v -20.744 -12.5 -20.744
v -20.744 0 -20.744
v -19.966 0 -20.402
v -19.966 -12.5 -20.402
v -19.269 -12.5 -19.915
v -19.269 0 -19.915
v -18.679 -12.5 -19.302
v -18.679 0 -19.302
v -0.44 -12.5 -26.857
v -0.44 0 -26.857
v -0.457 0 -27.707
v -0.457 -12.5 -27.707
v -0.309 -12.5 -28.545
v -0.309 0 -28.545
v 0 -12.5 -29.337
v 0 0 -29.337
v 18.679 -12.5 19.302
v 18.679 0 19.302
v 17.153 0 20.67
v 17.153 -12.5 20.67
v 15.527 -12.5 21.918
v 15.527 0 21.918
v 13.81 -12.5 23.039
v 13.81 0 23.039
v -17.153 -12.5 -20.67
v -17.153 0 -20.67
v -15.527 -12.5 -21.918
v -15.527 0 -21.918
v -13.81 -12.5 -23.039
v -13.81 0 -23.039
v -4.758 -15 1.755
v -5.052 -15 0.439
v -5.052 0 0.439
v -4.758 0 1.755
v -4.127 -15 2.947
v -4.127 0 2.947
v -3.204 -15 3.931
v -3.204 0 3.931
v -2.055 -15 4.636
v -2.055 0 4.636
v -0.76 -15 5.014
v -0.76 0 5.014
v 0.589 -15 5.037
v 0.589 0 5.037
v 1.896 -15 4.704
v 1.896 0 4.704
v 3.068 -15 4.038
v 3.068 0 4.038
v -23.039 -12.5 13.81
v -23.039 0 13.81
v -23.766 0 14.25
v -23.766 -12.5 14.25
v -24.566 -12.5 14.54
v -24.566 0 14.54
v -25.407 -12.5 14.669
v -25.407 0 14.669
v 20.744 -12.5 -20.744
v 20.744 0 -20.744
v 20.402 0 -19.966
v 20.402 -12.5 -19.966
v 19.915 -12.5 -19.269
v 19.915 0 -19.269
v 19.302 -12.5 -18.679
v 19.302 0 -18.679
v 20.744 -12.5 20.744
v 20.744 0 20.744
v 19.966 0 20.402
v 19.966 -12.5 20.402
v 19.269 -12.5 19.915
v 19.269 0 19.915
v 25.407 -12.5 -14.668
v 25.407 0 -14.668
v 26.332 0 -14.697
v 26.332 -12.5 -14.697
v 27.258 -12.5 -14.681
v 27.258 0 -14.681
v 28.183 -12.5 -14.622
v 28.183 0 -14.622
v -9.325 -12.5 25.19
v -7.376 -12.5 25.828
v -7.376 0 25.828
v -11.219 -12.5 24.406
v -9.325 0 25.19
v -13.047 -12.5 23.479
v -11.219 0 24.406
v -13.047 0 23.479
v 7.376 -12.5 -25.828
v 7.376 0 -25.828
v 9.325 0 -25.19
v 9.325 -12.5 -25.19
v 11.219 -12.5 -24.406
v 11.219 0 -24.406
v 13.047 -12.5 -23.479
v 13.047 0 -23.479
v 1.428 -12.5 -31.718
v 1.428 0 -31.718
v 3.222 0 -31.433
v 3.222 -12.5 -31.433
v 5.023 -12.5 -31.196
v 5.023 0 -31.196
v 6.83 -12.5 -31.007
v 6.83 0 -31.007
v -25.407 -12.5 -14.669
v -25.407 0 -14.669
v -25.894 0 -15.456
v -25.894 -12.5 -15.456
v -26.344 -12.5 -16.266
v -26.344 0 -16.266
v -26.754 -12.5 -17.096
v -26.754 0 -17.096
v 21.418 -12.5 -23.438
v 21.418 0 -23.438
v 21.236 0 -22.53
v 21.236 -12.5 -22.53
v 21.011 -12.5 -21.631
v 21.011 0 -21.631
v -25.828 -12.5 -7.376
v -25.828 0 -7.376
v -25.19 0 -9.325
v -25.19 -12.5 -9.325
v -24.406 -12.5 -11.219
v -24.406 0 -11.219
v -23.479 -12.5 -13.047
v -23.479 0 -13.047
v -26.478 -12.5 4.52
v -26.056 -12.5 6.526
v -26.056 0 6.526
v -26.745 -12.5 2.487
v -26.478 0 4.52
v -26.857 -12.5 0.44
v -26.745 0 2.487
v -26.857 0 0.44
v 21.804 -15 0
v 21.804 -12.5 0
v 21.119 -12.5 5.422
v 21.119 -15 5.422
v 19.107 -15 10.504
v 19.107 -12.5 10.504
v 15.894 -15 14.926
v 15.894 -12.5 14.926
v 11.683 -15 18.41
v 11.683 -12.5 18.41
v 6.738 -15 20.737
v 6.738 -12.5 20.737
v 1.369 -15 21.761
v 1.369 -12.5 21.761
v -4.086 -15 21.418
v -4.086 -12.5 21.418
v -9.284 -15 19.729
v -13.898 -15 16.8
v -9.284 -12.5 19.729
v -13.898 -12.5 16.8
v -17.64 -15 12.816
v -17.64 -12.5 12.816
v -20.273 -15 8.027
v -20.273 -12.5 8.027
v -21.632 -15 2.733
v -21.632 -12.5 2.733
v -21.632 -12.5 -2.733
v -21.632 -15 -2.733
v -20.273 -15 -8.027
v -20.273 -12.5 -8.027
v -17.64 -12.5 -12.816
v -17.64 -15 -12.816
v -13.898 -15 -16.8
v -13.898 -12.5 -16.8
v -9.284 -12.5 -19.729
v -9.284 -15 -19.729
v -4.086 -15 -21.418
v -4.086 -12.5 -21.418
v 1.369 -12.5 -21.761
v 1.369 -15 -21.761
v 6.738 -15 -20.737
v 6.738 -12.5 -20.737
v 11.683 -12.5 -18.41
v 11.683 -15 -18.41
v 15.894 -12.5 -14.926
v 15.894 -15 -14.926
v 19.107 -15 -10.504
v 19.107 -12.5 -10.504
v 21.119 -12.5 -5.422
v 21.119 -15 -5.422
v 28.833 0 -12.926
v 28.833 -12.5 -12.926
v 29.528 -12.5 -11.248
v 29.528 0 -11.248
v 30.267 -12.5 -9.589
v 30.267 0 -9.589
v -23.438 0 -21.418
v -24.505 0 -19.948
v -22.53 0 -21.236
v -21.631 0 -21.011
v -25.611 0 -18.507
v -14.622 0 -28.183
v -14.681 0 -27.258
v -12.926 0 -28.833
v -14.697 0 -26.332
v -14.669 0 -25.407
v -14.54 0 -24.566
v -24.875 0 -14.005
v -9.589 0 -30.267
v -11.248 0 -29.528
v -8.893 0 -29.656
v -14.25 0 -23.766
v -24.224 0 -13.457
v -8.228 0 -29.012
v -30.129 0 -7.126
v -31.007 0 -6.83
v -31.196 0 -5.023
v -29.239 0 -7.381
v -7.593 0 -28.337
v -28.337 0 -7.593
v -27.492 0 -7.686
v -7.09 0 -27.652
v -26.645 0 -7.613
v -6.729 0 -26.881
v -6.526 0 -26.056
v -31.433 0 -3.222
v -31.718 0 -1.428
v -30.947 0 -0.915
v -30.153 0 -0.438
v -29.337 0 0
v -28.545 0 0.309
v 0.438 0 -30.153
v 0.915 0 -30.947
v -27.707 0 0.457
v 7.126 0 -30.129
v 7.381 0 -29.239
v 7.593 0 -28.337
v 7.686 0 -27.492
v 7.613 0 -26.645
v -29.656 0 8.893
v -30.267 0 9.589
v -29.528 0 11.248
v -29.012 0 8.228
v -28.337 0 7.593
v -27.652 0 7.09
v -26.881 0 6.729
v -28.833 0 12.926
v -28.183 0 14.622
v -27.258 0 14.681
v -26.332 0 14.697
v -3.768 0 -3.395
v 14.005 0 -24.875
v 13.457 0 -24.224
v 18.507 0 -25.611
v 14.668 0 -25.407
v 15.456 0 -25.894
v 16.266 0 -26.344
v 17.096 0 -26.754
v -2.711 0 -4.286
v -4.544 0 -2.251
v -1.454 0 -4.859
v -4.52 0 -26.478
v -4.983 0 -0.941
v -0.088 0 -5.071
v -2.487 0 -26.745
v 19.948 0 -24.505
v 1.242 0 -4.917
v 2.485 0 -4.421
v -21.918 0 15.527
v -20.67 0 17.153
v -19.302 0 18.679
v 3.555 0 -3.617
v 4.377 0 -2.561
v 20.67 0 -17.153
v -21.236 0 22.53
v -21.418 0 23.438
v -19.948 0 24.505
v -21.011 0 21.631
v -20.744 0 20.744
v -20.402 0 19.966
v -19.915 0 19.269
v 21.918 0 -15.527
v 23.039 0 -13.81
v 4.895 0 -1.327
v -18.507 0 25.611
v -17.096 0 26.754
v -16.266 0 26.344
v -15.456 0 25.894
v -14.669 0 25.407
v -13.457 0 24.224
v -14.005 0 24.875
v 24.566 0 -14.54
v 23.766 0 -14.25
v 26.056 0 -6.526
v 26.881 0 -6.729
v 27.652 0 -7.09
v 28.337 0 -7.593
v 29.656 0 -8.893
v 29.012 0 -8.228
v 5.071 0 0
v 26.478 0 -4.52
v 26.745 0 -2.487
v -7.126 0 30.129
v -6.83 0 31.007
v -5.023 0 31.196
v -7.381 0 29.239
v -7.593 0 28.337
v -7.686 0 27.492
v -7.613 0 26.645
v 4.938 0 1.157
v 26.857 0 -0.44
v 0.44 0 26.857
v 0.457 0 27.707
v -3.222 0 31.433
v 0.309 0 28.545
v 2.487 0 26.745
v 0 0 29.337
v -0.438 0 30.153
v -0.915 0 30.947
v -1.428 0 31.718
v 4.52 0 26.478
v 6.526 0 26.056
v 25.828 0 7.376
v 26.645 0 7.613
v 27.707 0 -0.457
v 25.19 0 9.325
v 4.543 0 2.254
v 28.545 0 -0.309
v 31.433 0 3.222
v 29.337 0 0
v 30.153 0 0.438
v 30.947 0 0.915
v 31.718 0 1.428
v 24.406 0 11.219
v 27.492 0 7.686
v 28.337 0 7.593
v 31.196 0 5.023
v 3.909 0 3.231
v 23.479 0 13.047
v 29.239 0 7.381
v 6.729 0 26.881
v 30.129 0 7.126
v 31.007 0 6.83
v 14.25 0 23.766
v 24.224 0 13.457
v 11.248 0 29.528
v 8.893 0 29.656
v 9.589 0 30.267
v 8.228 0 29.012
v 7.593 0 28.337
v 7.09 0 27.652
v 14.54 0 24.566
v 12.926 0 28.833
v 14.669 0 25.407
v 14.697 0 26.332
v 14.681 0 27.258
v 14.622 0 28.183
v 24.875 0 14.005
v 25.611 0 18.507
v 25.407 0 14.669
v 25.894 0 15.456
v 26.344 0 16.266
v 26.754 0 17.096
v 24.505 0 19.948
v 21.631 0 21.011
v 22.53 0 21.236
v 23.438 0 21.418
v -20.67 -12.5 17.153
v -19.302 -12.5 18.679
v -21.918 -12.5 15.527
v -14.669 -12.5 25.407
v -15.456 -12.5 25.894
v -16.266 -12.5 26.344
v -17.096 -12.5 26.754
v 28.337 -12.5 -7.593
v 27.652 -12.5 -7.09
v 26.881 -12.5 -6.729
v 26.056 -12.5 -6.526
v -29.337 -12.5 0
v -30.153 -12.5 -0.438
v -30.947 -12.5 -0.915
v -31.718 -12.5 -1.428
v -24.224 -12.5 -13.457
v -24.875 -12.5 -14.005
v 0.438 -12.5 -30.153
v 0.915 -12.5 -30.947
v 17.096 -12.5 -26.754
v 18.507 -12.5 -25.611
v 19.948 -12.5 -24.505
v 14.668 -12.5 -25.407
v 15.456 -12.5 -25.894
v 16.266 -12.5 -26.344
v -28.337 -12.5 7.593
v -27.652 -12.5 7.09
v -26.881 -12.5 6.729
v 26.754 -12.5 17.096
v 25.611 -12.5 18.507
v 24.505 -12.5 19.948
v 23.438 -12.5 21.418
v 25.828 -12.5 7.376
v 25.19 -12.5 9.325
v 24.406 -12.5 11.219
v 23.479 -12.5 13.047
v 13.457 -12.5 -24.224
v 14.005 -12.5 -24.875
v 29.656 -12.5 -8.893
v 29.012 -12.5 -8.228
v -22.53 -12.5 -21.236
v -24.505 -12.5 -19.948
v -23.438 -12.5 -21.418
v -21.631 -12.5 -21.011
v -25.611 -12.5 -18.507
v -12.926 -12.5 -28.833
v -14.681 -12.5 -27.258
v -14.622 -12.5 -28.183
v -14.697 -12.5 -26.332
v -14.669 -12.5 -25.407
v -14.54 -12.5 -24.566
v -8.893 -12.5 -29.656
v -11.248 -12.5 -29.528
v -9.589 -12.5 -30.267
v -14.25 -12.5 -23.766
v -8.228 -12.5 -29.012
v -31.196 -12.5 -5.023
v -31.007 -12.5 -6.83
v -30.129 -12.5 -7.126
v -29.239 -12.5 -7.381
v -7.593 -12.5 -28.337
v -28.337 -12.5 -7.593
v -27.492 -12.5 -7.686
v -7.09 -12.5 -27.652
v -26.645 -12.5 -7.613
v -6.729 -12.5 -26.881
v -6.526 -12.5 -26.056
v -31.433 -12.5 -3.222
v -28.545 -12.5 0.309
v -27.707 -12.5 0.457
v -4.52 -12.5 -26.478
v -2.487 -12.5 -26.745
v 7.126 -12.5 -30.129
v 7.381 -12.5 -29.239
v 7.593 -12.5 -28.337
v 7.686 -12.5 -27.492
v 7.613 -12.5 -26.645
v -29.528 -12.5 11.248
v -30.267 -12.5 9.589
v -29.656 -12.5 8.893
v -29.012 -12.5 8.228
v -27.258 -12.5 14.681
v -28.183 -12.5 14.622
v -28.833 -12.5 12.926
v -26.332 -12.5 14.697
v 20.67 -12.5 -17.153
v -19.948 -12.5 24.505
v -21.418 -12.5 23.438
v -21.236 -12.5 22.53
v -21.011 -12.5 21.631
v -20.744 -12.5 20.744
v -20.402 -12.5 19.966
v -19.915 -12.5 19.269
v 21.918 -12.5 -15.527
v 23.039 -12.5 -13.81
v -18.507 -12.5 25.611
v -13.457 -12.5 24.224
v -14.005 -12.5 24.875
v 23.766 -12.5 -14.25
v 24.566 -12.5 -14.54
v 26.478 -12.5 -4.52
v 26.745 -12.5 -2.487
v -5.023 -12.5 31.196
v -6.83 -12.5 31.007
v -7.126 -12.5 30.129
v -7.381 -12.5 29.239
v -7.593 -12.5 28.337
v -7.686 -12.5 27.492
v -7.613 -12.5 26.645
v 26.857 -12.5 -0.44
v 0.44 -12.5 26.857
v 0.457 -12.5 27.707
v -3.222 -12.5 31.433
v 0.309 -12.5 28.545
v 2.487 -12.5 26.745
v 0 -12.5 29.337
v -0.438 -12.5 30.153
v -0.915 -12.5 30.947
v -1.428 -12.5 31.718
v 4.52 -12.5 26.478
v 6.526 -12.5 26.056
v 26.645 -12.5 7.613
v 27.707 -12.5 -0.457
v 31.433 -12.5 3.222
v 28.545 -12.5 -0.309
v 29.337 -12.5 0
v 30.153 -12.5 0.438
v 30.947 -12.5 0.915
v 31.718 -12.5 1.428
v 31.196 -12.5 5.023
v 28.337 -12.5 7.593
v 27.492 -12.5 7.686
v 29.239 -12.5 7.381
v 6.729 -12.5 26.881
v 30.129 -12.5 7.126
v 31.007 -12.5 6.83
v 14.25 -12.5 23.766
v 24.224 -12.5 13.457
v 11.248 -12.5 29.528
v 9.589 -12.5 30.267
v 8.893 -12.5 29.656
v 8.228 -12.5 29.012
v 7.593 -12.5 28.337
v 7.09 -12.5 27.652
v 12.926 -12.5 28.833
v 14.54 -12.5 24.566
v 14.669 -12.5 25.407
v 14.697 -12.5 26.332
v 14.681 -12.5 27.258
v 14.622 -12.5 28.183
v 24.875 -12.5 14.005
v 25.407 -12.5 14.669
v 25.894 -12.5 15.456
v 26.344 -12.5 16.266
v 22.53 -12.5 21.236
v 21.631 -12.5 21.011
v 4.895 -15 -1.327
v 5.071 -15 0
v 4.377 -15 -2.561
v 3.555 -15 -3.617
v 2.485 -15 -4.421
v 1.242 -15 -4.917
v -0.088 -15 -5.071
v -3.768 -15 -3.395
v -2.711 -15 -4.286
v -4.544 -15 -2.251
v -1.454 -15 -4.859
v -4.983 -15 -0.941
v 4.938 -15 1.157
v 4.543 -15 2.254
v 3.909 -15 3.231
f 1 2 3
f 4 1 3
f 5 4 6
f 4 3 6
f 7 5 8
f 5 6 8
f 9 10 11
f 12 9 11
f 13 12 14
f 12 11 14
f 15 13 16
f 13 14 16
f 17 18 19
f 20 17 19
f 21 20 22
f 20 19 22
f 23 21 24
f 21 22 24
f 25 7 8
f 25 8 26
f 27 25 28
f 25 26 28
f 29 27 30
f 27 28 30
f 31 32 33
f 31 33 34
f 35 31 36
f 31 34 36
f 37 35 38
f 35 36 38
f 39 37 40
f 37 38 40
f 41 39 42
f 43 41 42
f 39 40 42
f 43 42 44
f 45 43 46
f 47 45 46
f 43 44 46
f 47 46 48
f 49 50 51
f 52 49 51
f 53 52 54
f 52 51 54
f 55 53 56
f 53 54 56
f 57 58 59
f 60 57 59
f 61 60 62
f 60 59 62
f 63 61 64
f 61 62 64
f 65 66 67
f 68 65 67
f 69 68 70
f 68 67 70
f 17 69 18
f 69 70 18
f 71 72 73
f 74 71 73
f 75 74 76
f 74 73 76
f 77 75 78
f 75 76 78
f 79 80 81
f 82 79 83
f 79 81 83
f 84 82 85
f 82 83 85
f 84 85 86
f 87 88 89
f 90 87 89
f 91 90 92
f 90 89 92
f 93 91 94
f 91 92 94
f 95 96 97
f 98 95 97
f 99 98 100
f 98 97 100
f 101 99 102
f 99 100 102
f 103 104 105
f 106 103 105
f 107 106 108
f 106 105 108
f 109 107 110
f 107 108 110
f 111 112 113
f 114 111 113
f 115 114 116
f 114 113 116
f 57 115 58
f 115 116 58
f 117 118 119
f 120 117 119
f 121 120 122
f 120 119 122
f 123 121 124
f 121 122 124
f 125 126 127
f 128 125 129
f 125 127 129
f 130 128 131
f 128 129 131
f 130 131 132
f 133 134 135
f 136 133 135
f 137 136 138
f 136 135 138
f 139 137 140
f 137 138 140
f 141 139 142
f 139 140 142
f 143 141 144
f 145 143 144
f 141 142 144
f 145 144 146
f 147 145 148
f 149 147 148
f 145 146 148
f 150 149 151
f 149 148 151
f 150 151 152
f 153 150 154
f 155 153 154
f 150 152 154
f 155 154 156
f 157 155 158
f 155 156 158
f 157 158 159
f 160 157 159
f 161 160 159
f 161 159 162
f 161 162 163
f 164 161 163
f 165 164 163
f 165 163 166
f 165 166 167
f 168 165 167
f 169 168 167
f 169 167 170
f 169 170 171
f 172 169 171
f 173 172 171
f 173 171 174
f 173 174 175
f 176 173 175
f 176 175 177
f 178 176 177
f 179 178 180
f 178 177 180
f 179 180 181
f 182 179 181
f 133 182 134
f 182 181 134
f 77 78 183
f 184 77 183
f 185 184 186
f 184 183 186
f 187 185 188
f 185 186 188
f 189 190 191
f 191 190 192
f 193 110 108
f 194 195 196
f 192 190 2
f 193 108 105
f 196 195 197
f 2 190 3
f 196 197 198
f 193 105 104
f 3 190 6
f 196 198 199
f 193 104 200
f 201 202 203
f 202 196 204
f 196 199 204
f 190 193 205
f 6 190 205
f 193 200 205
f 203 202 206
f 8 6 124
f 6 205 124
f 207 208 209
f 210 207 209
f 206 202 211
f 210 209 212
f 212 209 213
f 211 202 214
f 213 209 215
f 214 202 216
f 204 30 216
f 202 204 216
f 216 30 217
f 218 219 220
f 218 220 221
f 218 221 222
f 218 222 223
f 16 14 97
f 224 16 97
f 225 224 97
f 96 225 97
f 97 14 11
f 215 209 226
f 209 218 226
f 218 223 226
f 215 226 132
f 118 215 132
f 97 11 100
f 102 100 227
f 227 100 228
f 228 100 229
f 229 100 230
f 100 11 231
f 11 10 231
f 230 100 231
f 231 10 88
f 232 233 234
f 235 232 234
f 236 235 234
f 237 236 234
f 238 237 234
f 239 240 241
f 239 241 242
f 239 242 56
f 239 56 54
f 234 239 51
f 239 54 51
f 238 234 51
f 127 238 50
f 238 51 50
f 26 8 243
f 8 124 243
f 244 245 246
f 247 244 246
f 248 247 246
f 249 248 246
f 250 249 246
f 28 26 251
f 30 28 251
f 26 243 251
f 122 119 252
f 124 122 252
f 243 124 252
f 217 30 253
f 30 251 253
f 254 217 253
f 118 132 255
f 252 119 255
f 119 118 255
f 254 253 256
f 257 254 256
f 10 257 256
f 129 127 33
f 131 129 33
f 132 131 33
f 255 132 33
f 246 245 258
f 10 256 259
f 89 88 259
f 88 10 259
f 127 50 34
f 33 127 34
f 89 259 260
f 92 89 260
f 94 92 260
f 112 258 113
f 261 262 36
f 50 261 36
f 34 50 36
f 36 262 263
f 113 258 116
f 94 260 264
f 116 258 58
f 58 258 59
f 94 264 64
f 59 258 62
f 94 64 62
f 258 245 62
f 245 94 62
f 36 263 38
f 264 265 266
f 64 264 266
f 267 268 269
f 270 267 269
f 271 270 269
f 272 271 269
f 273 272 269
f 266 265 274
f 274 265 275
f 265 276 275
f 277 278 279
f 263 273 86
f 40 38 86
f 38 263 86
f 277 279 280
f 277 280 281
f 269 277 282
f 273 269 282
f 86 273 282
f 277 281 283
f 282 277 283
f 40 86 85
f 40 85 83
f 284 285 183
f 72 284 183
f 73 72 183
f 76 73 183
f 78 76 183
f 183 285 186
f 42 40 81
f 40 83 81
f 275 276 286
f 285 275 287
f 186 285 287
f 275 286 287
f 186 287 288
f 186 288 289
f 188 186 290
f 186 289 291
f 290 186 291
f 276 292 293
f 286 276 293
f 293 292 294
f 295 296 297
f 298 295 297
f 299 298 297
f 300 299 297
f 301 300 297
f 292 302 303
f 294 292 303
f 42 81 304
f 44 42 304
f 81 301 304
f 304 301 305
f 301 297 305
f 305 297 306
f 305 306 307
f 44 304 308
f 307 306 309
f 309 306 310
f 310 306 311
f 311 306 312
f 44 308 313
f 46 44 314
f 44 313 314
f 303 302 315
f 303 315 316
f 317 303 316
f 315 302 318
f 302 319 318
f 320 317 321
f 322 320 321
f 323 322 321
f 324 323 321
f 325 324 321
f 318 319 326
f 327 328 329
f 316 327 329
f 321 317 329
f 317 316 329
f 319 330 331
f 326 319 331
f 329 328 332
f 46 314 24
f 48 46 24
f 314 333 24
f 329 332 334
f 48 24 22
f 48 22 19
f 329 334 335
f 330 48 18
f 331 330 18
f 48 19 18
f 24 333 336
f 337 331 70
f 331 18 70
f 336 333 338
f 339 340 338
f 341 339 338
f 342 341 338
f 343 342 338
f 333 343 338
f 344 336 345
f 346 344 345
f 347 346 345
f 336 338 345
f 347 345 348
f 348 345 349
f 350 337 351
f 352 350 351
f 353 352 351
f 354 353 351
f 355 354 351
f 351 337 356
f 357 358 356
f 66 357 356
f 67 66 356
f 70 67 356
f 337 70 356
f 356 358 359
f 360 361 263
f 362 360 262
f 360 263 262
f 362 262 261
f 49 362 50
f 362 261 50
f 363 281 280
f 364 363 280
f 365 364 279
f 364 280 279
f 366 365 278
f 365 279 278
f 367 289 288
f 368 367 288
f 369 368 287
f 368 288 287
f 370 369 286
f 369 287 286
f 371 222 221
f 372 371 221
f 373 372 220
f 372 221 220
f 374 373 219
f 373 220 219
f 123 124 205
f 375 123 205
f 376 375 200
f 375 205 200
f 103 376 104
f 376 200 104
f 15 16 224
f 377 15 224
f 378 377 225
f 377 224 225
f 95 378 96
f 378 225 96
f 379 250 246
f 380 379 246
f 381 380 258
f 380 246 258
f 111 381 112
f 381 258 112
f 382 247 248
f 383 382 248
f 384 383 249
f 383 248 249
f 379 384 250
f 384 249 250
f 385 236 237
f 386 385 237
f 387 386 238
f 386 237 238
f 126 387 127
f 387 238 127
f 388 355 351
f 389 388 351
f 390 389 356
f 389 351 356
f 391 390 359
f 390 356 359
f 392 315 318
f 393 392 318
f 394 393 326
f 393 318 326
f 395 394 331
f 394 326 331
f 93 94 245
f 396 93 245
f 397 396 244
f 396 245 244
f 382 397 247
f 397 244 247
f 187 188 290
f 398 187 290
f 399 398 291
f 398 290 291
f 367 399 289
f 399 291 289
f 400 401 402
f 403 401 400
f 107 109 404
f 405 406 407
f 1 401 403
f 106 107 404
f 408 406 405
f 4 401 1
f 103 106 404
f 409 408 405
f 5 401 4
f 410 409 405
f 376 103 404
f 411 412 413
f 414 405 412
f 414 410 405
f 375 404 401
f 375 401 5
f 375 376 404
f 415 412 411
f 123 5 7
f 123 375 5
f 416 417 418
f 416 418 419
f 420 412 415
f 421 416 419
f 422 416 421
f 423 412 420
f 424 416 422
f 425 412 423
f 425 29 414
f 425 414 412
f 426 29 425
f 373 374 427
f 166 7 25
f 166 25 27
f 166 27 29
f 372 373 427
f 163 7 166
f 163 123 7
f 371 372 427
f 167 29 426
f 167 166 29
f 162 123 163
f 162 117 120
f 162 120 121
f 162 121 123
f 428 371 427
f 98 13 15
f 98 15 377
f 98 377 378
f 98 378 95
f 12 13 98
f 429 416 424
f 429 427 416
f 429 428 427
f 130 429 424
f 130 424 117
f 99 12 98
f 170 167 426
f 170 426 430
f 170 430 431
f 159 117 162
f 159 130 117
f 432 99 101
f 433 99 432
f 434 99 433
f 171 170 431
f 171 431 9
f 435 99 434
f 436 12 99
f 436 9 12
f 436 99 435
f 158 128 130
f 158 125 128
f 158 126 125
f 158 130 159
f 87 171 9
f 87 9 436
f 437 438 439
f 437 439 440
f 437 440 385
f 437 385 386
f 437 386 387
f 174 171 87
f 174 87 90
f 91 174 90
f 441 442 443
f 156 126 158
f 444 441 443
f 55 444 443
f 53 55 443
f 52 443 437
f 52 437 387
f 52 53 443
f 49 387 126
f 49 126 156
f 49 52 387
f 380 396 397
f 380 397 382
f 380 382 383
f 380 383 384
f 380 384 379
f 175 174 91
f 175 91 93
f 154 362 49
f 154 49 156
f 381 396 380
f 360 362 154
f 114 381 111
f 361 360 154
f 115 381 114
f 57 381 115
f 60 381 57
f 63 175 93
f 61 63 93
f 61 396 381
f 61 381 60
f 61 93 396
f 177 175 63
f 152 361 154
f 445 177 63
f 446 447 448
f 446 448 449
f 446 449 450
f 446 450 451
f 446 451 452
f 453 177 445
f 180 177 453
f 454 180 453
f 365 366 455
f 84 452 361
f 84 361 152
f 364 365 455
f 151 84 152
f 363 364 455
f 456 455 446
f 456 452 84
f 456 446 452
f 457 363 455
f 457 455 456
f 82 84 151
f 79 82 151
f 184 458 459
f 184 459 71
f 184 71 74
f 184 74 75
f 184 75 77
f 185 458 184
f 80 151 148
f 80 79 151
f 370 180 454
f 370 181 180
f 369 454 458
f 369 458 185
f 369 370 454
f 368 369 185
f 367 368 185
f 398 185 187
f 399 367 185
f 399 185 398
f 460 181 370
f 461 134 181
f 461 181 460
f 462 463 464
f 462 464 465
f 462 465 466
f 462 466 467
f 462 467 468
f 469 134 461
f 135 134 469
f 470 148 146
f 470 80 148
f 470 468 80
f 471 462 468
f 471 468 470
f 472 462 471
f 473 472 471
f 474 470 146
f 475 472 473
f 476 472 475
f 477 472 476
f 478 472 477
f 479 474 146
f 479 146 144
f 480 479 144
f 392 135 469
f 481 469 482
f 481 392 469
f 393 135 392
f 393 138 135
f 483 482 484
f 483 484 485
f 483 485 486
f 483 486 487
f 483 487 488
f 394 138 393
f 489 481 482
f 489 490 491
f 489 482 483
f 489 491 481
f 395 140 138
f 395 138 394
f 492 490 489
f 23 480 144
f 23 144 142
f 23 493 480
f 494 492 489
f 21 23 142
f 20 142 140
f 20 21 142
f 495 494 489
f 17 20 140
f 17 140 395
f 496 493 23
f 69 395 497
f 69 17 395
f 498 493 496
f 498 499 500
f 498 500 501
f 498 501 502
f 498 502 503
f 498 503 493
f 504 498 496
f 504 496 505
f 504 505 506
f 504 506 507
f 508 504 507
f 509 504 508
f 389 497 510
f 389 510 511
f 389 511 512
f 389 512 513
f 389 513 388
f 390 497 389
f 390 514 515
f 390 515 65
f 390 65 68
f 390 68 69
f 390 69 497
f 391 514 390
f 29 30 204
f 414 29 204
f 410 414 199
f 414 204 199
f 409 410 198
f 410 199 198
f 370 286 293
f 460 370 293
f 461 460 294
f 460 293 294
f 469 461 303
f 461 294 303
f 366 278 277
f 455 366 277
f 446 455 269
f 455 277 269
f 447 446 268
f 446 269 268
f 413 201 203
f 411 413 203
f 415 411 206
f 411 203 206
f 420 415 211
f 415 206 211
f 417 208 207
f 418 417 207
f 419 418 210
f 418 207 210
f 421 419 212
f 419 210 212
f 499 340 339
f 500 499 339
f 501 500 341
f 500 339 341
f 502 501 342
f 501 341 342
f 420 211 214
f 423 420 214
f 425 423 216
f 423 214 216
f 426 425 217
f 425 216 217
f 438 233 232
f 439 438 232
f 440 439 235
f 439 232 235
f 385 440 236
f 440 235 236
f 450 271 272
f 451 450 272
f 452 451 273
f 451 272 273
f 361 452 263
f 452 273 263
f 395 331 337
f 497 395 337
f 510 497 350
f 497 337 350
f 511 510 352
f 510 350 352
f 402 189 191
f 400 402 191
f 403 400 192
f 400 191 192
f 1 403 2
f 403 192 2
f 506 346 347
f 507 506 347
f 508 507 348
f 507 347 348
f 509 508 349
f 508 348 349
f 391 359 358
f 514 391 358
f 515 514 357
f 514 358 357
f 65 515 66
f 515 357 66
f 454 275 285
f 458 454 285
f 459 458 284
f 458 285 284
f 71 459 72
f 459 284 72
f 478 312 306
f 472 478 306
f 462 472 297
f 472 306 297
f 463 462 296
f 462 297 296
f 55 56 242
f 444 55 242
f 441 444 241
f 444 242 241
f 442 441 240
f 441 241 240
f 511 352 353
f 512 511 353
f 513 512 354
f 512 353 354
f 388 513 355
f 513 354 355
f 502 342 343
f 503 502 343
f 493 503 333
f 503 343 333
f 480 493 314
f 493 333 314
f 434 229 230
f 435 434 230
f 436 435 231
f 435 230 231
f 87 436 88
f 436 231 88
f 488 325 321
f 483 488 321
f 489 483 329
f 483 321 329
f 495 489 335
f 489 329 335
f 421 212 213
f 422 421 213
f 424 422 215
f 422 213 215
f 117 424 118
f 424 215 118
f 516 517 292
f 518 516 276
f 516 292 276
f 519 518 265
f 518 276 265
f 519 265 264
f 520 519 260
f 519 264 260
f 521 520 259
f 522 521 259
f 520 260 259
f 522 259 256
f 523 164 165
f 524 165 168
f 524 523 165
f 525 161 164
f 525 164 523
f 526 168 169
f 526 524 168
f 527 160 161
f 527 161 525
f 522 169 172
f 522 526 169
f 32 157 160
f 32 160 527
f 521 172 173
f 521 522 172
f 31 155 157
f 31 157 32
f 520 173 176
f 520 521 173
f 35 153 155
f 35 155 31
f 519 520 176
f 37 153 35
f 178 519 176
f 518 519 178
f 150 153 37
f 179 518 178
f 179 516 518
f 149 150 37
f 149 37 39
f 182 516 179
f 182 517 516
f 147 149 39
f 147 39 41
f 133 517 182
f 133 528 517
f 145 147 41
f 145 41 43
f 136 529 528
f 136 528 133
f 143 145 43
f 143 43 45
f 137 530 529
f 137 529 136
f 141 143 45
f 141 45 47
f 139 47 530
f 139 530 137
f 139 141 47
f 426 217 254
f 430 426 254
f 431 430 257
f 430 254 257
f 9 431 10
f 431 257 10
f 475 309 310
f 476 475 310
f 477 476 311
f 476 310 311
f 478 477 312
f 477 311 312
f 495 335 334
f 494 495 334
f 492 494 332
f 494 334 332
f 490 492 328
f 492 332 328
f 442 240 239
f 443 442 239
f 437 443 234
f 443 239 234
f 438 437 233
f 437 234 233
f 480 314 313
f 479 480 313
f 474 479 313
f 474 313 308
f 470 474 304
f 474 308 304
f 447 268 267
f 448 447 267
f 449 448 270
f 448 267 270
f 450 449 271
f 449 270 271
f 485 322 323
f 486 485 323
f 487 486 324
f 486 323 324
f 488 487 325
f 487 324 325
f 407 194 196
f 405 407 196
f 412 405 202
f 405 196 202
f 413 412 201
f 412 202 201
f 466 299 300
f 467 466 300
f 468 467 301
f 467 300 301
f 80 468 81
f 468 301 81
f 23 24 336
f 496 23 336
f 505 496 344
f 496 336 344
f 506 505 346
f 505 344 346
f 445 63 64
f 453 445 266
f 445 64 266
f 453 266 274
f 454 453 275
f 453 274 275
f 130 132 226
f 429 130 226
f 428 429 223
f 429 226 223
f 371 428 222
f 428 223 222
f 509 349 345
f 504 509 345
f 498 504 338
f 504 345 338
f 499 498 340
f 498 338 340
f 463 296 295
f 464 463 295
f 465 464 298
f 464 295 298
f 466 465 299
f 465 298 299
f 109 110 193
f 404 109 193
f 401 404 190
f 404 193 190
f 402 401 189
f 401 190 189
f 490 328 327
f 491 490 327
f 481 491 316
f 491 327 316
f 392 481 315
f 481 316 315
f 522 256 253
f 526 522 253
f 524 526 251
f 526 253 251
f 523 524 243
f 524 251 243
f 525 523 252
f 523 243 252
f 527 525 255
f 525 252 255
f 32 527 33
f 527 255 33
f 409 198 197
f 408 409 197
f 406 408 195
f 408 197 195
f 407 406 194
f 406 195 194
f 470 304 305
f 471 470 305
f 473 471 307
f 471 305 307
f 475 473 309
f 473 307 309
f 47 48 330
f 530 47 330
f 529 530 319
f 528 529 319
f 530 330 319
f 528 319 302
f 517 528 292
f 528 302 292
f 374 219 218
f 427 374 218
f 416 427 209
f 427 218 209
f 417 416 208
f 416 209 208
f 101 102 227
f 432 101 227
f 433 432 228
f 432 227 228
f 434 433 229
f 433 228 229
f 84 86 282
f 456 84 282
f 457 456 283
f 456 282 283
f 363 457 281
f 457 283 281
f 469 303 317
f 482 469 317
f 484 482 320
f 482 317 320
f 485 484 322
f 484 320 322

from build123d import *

# Parameters (mm, degrees)
F0_R     = 21.803991
F1_DEPTH = 12.5
F2_COUNT = 12
F3_DEPTH = 15


with BuildPart() as f1:
    # F0 (on Front) → F1 (new body)
    with BuildSketch(Plane.XZ):
        with BuildLine():
            ThreePointArc((-7.376443, 25.827786), (-16.176395, -21.443197), (26.8605, 0))
            ThreePointArc((26.8605, 0), (19.148304, 18.836903), (0.440374, 26.85689))
            ThreePointArc((0.440374, 26.85689), (-3.505999, 26.630705), (-7.376443, 25.827786))
        make_face()
        Circle(F0_R, mode=Mode.SUBTRACT)
        with BuildLine():
            ThreePointArc((-7.376443, 25.827786), (-3.505999, 26.630705), (0.440374, 26.85689))
            ThreePointArc((0.440374, 26.85689), (0.403553, 28.129504), (0, 29.337))
            ThreePointArc((0, 29.337), (-0.67184, 30.552787), (-1.42822, 31.717861))
            ThreePointArc((-1.42822, 31.717861), (-4.121867, 31.308688), (-6.829632, 31.006751))
            ThreePointArc((-6.829632, 31.006751), (-7.258695, 29.685611), (-7.592974, 28.337366))
            ThreePointArc((-7.592974, 28.337366), (-7.670253, 27.066567), (-7.376443, 25.827786))
        make_face()
    extrude(amount=F1_DEPTH)



with BuildPart() as f2_1:
    # F2: instance of F1
    add(f1.part.rotate(Axis((0, 0, 0), (0, 1, 0)), 1 * 360 / F2_COUNT))


with BuildPart() as f2_2:
    # F2: instance of F1
    add(f1.part.rotate(Axis((0, 0, 0), (0, 1, 0)), 2 * 360 / F2_COUNT))


with BuildPart() as f2_3:
    # F2: instance of F1
    add(f1.part.rotate(Axis((0, 0, 0), (0, 1, 0)), 3 * 360 / F2_COUNT))


with BuildPart() as f2_4:
    # F2: instance of F1
    add(f1.part.rotate(Axis((0, 0, 0), (0, 1, 0)), 4 * 360 / F2_COUNT))


with BuildPart() as f2_5:
    # F2: instance of F1
    add(f1.part.rotate(Axis((0, 0, 0), (0, 1, 0)), 5 * 360 / F2_COUNT))


with BuildPart() as f2_6:
    # F2: instance of F1
    add(f1.part.rotate(Axis((0, 0, 0), (0, 1, 0)), 6 * 360 / F2_COUNT))


with BuildPart() as f2_7:
    # F2: instance of F1
    add(f1.part.rotate(Axis((0, 0, 0), (0, 1, 0)), 7 * 360 / F2_COUNT))


with BuildPart() as f2_8:
    # F2: instance of F1
    add(f1.part.rotate(Axis((0, 0, 0), (0, 1, 0)), 8 * 360 / F2_COUNT))


with BuildPart() as f2_9:
    # F2: instance of F1
    add(f1.part.rotate(Axis((0, 0, 0), (0, 1, 0)), 9 * 360 / F2_COUNT))


with BuildPart() as f2_10:
    # F2: instance of F1
    add(f1.part.rotate(Axis((0, 0, 0), (0, 1, 0)), 10 * 360 / F2_COUNT))


with BuildPart() as f2_11:
    # F2: instance of F1
    add(f1.part.rotate(Axis((0, 0, 0), (0, 1, 0)), 11 * 360 / F2_COUNT))


with BuildPart() as f1_1:
    add(f1.part)

    add(f2_1.part)  # F3 merges F2_1

    add(f2_2.part)  # F3 merges F2_2

    add(f2_3.part)  # F3 merges F2_3

    add(f2_4.part)  # F3 merges F2_4

    add(f2_5.part)  # F3 merges F2_5

    add(f2_6.part)  # F3 merges F2_6

    add(f2_7.part)  # F3 merges F2_7

    add(f2_8.part)  # F3 merges F2_8

    add(f2_9.part)  # F3 merges F2_9

    add(f2_10.part)  # F3 merges F2_10

    add(f2_11.part)  # F3 merges F2_11
    # F0 (on Front) → F3 (join)
    with BuildSketch(Plane.XZ):
        Circle(F0_R)
        with BuildLine():
            ThreePointArc((5.071371, 0), (3.55472, -3.61701), (-0.088088, -5.070606))
            ThreePointArc((-0.088088, -5.070606), (-3.767643, -3.394653), (-5.052327, 0.439082))
            ThreePointArc((-5.052327, 0.439082), (-2.054693, 4.63649), (3.068356, 4.03782))
            ThreePointArc((3.068356, 4.03782), (4.543103, 2.253667), (5.071371, 0))
        make_face(mode=Mode.SUBTRACT)
    extrude(amount=F3_DEPTH)


solid = f1_1.part
